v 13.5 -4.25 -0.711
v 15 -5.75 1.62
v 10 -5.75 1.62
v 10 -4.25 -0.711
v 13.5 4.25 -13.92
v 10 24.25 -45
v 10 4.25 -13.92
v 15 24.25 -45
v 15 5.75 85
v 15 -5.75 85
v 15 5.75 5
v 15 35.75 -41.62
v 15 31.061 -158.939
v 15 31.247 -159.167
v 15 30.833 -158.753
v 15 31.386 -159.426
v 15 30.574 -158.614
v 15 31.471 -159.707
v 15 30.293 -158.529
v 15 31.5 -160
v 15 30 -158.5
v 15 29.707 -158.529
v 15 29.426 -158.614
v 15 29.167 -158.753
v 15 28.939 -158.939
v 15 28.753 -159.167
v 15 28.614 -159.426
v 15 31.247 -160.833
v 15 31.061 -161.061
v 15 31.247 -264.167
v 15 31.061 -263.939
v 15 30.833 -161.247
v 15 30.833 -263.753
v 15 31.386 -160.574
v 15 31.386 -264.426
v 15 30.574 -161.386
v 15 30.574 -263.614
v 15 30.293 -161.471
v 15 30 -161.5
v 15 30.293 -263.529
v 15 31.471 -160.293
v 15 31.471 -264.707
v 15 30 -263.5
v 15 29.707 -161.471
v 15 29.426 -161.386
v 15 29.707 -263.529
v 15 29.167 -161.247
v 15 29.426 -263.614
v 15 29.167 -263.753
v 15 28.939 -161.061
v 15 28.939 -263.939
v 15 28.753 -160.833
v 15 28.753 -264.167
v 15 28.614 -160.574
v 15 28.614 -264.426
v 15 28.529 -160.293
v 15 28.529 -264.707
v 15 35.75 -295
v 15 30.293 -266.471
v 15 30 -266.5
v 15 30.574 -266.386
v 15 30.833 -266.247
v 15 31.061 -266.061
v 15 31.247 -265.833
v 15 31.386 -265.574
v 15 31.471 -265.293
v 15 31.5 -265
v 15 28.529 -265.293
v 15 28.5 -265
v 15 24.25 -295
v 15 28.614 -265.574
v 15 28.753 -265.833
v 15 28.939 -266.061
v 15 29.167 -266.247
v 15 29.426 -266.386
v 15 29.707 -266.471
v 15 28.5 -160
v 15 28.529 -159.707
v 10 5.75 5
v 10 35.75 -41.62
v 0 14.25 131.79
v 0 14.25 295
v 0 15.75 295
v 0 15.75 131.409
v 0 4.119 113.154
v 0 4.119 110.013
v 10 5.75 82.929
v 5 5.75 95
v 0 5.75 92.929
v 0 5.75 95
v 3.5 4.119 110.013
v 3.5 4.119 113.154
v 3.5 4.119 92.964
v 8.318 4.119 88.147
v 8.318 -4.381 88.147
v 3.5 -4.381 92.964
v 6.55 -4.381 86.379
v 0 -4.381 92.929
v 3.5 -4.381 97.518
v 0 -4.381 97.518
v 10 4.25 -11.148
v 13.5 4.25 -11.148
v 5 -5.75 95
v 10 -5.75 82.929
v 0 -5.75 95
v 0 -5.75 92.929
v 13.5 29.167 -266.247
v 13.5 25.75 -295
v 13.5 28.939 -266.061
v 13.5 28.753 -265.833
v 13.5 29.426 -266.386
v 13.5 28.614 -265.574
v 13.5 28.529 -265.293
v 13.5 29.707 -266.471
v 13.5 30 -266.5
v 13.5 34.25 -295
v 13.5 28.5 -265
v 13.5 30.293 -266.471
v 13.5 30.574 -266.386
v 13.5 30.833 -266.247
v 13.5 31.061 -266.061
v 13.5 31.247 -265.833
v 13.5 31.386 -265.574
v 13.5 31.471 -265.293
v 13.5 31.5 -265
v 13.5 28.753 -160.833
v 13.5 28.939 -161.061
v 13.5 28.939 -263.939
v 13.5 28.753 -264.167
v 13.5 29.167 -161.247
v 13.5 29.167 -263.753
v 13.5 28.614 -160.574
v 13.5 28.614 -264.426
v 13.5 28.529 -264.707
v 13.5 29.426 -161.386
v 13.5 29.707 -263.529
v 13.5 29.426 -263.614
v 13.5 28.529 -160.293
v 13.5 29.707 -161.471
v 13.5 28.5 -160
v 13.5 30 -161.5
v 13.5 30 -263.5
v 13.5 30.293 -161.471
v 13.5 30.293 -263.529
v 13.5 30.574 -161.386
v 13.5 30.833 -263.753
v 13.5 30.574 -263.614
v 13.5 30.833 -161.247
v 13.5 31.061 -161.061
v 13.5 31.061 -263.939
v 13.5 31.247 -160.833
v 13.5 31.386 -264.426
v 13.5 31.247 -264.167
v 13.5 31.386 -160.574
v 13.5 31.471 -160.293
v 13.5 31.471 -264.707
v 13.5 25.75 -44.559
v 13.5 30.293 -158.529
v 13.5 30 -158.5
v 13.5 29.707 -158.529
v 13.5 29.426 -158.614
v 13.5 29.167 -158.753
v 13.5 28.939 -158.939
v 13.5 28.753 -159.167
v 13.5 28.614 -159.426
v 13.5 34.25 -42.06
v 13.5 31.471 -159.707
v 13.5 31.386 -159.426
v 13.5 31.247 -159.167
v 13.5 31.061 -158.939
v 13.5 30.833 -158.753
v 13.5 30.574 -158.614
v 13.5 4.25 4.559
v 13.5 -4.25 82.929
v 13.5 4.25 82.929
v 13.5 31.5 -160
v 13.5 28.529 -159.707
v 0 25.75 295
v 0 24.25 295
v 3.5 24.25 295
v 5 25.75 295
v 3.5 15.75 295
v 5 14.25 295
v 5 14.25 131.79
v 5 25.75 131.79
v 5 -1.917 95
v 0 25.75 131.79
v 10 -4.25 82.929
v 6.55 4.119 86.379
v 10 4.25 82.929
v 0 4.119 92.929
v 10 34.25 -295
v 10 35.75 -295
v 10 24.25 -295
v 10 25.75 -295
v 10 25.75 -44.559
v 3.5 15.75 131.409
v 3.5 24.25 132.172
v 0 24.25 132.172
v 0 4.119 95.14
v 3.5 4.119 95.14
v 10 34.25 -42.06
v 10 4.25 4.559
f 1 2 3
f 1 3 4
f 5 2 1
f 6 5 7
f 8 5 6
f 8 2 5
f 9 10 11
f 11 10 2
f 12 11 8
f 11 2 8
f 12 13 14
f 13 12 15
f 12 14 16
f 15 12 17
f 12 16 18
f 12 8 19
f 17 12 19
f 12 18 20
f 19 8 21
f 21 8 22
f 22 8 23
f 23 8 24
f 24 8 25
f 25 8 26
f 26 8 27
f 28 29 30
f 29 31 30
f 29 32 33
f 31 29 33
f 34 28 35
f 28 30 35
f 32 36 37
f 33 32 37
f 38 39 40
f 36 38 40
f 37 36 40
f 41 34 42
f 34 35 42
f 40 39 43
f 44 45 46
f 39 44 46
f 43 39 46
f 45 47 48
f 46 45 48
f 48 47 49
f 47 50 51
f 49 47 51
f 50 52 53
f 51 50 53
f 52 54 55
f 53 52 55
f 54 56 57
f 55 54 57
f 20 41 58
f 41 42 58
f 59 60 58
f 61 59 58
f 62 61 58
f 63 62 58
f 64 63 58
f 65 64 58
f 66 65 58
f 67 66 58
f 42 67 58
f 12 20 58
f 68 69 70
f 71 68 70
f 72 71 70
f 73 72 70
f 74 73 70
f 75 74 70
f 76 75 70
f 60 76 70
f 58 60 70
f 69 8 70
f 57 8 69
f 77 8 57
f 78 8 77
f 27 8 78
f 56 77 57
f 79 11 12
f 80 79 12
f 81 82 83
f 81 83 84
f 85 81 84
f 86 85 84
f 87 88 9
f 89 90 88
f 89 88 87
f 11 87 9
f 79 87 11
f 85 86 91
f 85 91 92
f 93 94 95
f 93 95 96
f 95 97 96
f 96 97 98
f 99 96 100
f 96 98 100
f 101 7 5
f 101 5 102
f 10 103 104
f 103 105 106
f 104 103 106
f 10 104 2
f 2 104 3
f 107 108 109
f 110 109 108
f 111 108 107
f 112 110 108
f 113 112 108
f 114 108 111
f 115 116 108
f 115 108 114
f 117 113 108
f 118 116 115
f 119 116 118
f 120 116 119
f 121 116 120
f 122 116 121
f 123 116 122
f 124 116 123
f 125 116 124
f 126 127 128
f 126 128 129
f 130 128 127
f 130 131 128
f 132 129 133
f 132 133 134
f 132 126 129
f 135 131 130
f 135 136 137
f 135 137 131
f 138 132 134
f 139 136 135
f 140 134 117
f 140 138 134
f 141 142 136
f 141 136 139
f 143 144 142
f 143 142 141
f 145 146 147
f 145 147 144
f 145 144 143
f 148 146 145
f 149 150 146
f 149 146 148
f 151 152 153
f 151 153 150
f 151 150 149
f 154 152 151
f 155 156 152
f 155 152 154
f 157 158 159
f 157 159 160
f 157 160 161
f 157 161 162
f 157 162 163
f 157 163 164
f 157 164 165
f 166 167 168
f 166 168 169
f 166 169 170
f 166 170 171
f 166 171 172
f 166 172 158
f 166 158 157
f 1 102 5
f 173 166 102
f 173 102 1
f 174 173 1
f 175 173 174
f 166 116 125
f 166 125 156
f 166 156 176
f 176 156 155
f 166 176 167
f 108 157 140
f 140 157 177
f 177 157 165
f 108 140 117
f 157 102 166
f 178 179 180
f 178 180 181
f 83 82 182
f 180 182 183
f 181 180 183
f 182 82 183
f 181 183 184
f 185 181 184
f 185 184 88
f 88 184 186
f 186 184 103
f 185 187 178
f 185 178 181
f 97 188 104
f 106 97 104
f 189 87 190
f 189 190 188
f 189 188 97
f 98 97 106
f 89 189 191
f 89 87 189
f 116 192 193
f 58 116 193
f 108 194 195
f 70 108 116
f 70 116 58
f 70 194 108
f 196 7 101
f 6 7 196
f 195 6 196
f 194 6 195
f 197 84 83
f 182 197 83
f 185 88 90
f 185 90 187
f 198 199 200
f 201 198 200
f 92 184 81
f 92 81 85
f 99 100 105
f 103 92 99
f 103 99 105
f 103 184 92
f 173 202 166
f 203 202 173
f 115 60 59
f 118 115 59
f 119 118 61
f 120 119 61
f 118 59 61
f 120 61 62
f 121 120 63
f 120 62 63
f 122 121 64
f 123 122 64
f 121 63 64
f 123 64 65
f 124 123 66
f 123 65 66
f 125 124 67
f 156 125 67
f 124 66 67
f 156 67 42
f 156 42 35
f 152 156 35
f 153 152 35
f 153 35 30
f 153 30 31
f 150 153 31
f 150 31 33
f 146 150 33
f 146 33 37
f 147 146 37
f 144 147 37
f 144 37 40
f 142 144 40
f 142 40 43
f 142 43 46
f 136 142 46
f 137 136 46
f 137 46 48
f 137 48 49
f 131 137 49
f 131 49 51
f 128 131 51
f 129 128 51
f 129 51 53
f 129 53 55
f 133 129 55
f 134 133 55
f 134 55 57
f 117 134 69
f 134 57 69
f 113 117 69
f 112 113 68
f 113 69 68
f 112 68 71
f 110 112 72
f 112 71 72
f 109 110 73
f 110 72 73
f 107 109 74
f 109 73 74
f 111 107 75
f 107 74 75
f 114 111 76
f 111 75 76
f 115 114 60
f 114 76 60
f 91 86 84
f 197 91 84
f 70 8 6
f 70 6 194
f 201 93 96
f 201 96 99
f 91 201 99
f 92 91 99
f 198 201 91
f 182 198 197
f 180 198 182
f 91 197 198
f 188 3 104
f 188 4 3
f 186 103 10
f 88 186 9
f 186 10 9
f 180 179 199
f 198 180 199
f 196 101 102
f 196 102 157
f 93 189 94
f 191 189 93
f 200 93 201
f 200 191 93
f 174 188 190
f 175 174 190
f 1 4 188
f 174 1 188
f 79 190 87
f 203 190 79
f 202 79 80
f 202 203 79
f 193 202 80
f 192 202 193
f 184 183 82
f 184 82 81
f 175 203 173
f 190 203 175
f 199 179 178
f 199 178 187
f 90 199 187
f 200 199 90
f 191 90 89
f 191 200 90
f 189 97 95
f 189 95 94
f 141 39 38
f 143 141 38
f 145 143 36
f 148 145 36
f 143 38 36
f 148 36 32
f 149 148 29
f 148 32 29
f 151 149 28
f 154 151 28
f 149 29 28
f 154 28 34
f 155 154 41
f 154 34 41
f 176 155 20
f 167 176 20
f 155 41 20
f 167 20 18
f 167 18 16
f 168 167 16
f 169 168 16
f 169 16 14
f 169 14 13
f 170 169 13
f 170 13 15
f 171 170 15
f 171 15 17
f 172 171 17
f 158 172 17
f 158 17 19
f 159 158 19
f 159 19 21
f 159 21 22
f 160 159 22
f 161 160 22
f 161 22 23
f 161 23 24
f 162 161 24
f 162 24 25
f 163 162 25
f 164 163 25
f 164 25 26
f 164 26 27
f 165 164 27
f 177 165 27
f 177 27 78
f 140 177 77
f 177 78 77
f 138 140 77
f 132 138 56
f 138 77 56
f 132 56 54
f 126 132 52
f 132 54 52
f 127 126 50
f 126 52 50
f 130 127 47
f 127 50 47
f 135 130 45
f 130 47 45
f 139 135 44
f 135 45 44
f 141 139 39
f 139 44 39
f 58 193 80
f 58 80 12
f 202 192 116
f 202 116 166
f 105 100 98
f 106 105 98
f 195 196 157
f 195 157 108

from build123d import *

# Parameters (mm, degrees)
SKETCH_1_W           = 590
SKETCH_1_H           = 11.5
EXTRUDE_1_DEPTH      = 5
SKETCH_2_W           = 590
SKETCH_2_H           = 8.5
CUT_EXTRUDE_1_DEPTH  = 3.5
SKETCH_3_W           = 390
SKETCH_3_H           = 11.5
EXTRUDE_2_DEPTH      = 10
CHAMFER_1_SIZE       = 10
CUT_EXTRUDE_2_DEPTH  = 296.604888322
SKETCH_5_W           = 377.928932188
SKETCH_5_H           = 8.5
CUT_EXTRUDE_3_DEPTH  = 3.5
SKETCH_7_W           = 9.262731361
SKETCH_7_H           = 8.5
CUT_EXTRUDE_5_DEPTH  = 2.5
SKETCH_8_W           = 5
SKETCH_8_H           = 200
EXTRUDE_3_DEPTH      = 20
CUT_EXTRUDE_6_DEPTH  = 297.29050356
CUT_EXTRUDE_7_DEPTH  = 297.29050356
CUT_EXTRUDE_8_DEPTH  = 3.5
SKETCH_12_W          = 5
SKETCH_12_H          = 300
EXTRUDE_4_DEPTH      = 30
CUT_EXTRUDE_9_DEPTH  = 298.536657405
CUT_EXTRUDE_10_DEPTH = 3.5
SKETCH_16_R          = 1.5
CUT_EXTRUDE_11_DEPTH = 298.536657405


with BuildPart() as part:
    # 草图1 → 凸台-拉伸1 (new body)
    with BuildSketch(Plane(origin=(0, 0, 0), x_dir=(0, 0, -1), z_dir=(1, 0, 0))):
        Rectangle(SKETCH_1_W, SKETCH_1_H)
    extrude(amount=EXTRUDE_1_DEPTH)

    # 草图2 → 切除-拉伸1 (cut)
    with BuildSketch(Plane.ZY):
        with Locations((0, -0.131137871)):
            Rectangle(SKETCH_2_W, SKETCH_2_H)
    extrude(amount=-CUT_EXTRUDE_1_DEPTH, mode=Mode.SUBTRACT)

    # 草图3 → 凸台-拉伸2 (add)
    with BuildSketch(Plane(origin=(5, 0, 0), x_dir=(0, 0, -1), z_dir=(1, 0, 0))):
        with Locations((100, 0)):
            Rectangle(SKETCH_3_W, SKETCH_3_H)
    extrude(amount=EXTRUDE_2_DEPTH)

    # 倒角1
    chamfer_1_edges = [part.edges().sort_by_distance(p)[0] for p in [
        (15, 0, 95),
    ]]
    chamfer(chamfer_1_edges, length=CHAMFER_1_SIZE - 0.0001)  # a hair under: the kernel refuses the full size

    # 草图4 → 切除-拉伸2 (cut, through all)
    with BuildSketch(Plane(origin=(0, 5.75, 0), x_dir=(1, 0, 0), z_dir=(0, 1, 0))):
        Polygon((0, -92.928932188), (0, 295), (10, 295), (10, -82.928932188), align=None)
    extrude(amount=-CUT_EXTRUDE_2_DEPTH, mode=Mode.SUBTRACT)

    # 草图5 → 切除-拉伸3 (cut)
    with BuildSketch(Plane.ZY.offset(-10)):
        with Locations((-106.035533906, 0)):
            Rectangle(SKETCH_5_W, SKETCH_5_H)
    extrude(amount=-CUT_EXTRUDE_3_DEPTH, mode=Mode.SUBTRACT)

    # 草图7 → 切除-拉伸5 (cut)
    with BuildSketch(Plane(origin=(46.464466094, 0, 46.464466094), x_dir=(-0.7071067811865471, 0, 0.7071067811865479), z_dir=(-0.7071067811865479, 0, -0.7071067811865471))):
        with Locations((61.079312439, -0.131137871)):
            Rectangle(SKETCH_7_W, SKETCH_7_H)
    extrude(amount=-CUT_EXTRUDE_5_DEPTH, mode=Mode.SUBTRACT)

    # 草图8 → 凸台-拉伸3 (add)
    with BuildSketch(Plane(origin=(0, 5.75, 0), x_dir=(1, 0, 0), z_dir=(0, 1, 0))):
        with Locations((2.5, -195)):
            Rectangle(SKETCH_8_W, SKETCH_8_H)
    extrude(amount=EXTRUDE_3_DEPTH)

    # 草图9 → 切除-拉伸6 (cut, through all)
    with BuildSketch(Plane(origin=(5, 0, 0), x_dir=(0, 0, -1), z_dir=(1, 0, 0))):
        Polygon((-295, 14.25), (-131.790247395, 14.25), (-95, -5.75), (-295, -5.75), align=None)
    extrude(amount=-CUT_EXTRUDE_6_DEPTH, mode=Mode.SUBTRACT)

    # 草图10 → 切除-拉伸7 (cut, through all)
    with BuildSketch(Plane(origin=(5, 0, 0), x_dir=(0, 0, -1), z_dir=(1, 0, 0))):
        Polygon((-95, 5.75), (-131.790247395, 25.75), (-95, 25.75), align=None)
    extrude(amount=-CUT_EXTRUDE_7_DEPTH, mode=Mode.SUBTRACT)

    # 草图11 → 切除-拉伸8 (cut)
    with BuildSketch(Plane.ZY):
        Polygon((132.171609821, 24.25), (95.140132691, 4.118862129), (110.013262981, 4.118862129), (131.408884969, 15.75), (295, 15.75), (295, 24.25), align=None)
    extrude(amount=-CUT_EXTRUDE_8_DEPTH, mode=Mode.SUBTRACT)

    # 草图12 → 凸台-拉伸4 (add)
    with BuildSketch(Plane(origin=(0, 5.75, 0), x_dir=(1, 0, 0), z_dir=(0, 1, 0))):
        with Locations((12.5, 145)):
            Rectangle(SKETCH_12_W, SKETCH_12_H)
    extrude(amount=EXTRUDE_4_DEPTH)

    # 草图13 → 切除-拉伸9 (cut, through all)
    with BuildSketch(Plane(origin=(15, 0, 0), x_dir=(0, 0, -1), z_dir=(1, 0, 0))):
        Polygon((-1.619558014, -5.75), (45, 24.25), (295, 24.25), (295, -5.75), align=None)
        Polygon((-5, 5.75), (41.619558014, 35.75), (-5, 35.75), align=None)
    extrude(amount=-CUT_EXTRUDE_9_DEPTH, mode=Mode.SUBTRACT)

    # 草图15 → 切除-拉伸10 (cut)
    with BuildSketch(Plane.ZY.offset(-10)):
        Polygon((-44.559072784, 25.75), (-295, 25.75), (-295, 34.25), (-42.06048523, 34.25), (4.559072784, 4.25), (-11.148389541, 4.25), align=None)
    extrude(amount=-CUT_EXTRUDE_10_DEPTH, mode=Mode.SUBTRACT)

    # 草图16 → 切除-拉伸11 (cut, through all)
    with BuildSketch(Plane(origin=(15, 0, 0), x_dir=(0, 0, -1), z_dir=(1, 0, 0))):
        with Locations((160, 30)):
            Circle(SKETCH_16_R)
        with Locations((265, 30)):
            Circle(SKETCH_16_R)
    extrude(amount=-CUT_EXTRUDE_11_DEPTH, mode=Mode.SUBTRACT)


solid = part.part
